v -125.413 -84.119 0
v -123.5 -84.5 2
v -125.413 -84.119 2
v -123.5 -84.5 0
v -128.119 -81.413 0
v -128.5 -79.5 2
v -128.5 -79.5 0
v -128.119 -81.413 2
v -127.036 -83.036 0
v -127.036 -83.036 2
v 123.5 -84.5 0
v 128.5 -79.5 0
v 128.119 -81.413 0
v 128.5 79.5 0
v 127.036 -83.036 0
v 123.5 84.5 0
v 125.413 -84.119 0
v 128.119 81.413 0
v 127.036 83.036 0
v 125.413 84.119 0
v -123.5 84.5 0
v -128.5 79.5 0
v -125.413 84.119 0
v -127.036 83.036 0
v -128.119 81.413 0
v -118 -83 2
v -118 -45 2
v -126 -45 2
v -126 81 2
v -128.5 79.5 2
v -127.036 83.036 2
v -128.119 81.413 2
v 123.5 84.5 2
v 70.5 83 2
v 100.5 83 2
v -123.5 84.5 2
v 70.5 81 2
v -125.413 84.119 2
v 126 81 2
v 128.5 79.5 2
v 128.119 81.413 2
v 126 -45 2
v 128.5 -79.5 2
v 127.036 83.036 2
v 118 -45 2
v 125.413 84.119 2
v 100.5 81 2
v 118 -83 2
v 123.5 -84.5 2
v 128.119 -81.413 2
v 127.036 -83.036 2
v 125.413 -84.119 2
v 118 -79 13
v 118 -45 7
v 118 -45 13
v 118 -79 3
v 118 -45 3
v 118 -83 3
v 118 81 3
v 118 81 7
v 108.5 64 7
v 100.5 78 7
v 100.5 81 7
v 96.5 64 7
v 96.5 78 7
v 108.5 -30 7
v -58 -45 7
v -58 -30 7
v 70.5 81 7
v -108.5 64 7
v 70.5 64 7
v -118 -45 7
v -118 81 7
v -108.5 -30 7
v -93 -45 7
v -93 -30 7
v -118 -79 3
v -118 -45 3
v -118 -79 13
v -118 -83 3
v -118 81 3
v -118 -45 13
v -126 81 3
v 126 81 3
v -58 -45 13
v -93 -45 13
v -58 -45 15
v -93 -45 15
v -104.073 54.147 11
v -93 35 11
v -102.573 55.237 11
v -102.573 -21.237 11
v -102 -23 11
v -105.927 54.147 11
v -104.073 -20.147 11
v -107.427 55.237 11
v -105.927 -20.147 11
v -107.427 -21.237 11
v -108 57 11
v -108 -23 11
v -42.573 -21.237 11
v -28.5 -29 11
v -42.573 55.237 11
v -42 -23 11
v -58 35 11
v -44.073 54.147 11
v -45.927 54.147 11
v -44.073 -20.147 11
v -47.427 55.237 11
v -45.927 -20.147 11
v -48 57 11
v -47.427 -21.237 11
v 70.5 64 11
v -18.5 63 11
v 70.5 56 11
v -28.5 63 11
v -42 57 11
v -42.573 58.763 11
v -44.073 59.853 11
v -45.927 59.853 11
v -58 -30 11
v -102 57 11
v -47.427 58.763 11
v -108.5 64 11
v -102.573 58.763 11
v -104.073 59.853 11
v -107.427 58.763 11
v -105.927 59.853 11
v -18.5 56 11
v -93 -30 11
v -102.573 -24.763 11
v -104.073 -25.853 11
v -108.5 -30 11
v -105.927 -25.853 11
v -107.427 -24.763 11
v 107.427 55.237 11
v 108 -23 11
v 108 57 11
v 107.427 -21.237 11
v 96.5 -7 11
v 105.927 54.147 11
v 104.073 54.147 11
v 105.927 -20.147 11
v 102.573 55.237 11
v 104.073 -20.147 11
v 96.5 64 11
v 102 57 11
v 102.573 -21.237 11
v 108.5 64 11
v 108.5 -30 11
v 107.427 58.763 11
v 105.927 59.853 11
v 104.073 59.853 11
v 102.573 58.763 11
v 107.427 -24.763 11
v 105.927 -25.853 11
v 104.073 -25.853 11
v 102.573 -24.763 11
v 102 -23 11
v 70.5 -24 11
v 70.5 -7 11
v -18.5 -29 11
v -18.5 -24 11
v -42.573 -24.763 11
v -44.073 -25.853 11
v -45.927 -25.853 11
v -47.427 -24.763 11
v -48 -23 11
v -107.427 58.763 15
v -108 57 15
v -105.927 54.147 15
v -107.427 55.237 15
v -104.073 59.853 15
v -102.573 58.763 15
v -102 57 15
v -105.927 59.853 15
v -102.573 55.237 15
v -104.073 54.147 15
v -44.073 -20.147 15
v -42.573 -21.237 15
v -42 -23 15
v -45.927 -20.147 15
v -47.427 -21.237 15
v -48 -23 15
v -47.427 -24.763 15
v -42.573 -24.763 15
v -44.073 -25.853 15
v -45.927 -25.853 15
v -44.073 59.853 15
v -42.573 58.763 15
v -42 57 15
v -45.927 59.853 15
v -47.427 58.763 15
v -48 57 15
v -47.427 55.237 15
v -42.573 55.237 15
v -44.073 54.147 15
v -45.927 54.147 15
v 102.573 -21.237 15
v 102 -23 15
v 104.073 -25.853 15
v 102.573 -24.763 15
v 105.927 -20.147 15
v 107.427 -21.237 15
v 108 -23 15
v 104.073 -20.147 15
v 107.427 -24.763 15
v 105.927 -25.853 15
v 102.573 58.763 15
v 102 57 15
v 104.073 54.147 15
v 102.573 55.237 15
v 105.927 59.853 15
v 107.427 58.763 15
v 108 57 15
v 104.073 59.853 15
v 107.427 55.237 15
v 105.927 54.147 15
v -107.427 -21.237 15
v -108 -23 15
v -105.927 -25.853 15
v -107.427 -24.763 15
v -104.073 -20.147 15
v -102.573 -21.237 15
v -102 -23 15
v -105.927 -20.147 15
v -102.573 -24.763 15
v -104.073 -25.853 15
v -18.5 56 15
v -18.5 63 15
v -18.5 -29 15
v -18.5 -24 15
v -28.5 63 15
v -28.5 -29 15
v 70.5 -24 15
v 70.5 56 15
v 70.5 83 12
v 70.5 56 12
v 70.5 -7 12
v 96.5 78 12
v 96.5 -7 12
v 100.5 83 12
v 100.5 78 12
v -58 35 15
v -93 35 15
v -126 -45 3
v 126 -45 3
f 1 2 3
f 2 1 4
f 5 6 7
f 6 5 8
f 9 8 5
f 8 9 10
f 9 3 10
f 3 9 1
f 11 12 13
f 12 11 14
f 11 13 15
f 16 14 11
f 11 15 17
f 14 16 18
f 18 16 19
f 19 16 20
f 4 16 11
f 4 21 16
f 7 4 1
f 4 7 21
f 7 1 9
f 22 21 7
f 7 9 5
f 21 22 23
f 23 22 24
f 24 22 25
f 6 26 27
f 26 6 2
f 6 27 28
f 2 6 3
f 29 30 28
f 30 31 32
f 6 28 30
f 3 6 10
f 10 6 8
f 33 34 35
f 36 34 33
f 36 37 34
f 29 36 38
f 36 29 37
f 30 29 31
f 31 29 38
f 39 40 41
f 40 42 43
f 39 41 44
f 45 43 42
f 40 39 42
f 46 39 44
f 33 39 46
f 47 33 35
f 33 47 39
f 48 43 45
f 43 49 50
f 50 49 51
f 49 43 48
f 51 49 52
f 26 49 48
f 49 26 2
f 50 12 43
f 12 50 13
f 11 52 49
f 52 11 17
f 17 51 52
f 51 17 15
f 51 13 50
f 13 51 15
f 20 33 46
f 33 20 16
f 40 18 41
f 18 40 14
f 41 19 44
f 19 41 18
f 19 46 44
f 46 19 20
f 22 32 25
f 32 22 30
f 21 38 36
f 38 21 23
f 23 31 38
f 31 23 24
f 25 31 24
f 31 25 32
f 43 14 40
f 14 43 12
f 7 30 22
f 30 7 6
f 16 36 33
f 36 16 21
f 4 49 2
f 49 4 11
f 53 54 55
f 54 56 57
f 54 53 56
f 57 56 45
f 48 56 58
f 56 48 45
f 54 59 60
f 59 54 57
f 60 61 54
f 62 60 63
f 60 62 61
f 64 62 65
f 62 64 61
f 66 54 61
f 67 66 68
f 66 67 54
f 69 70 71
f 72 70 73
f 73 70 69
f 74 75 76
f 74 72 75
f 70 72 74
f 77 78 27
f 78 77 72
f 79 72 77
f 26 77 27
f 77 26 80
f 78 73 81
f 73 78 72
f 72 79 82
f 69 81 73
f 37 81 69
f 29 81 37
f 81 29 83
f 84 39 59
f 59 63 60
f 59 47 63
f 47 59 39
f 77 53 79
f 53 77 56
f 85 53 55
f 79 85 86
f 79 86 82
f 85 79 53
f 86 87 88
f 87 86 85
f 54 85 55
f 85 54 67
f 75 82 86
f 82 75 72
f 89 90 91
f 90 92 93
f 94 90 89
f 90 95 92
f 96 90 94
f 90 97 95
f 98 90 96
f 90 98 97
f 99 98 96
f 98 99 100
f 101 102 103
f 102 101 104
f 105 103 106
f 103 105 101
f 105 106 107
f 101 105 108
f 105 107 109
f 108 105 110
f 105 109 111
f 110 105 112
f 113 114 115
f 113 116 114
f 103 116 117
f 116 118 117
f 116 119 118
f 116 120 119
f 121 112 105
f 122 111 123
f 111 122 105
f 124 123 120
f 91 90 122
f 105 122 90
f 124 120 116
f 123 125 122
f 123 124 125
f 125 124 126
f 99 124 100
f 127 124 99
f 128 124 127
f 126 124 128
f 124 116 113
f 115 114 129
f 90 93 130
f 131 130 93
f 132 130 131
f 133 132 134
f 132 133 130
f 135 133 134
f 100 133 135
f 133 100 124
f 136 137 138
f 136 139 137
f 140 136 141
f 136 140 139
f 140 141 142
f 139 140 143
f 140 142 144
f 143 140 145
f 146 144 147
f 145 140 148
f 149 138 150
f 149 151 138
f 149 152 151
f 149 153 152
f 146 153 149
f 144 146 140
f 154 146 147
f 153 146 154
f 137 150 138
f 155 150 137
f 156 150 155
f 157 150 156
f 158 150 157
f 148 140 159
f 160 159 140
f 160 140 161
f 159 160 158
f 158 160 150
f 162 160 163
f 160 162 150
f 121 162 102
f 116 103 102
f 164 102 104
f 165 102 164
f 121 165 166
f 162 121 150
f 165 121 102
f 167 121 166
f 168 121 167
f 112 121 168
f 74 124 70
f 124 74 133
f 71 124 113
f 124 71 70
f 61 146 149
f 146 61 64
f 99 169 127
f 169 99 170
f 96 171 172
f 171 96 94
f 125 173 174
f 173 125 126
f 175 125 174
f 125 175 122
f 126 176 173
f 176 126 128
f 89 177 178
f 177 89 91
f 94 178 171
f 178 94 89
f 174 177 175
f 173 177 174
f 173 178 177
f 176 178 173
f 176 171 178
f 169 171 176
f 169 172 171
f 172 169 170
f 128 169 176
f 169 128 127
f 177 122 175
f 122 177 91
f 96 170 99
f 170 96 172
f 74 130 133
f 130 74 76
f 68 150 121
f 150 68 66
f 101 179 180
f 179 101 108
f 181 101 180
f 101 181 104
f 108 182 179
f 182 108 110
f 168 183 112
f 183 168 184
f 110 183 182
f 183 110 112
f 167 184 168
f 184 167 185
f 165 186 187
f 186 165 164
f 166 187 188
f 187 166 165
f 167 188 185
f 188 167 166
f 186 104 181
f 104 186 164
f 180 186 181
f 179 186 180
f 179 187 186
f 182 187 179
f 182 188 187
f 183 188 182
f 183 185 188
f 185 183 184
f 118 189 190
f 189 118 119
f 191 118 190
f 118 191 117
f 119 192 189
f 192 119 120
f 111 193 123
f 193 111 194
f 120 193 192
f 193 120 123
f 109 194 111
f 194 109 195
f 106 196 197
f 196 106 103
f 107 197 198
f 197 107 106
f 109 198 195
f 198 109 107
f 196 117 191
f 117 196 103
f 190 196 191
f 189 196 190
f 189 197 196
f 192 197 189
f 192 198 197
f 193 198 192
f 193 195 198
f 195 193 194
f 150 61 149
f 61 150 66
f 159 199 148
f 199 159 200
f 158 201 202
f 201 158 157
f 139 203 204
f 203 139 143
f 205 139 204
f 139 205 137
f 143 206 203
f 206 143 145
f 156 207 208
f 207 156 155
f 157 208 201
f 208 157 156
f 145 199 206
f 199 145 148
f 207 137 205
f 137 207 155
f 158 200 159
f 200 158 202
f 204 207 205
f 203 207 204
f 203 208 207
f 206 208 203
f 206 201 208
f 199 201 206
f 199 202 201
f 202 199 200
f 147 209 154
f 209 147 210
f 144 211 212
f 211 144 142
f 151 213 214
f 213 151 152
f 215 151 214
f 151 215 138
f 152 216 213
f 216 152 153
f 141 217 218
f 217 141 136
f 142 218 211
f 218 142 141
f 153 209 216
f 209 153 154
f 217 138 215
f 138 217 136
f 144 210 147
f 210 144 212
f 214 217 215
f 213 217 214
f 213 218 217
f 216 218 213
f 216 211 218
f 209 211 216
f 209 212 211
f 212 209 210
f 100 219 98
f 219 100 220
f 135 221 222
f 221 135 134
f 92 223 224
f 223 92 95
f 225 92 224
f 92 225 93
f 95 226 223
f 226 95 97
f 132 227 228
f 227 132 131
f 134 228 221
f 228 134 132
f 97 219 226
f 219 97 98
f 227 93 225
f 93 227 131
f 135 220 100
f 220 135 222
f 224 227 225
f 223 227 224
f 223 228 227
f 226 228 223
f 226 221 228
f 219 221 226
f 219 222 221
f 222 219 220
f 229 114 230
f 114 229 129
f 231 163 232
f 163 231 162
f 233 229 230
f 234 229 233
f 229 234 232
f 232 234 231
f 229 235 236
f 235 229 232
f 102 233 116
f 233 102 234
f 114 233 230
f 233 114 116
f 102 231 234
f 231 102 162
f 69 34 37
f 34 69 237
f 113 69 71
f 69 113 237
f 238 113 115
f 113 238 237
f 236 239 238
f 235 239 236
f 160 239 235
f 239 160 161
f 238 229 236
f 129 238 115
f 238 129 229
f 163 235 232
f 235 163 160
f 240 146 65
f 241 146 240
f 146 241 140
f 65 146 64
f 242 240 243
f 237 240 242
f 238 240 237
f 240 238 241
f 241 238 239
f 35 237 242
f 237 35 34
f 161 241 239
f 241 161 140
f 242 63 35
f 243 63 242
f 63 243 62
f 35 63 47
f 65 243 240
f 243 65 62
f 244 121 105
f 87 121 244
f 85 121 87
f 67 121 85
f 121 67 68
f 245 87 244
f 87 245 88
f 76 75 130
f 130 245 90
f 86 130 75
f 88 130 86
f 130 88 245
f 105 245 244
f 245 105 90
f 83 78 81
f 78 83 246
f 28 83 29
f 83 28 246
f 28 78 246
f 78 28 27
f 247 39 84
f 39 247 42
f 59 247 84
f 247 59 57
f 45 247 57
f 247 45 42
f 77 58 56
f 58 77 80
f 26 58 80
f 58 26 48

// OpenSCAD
// file: ../externals/roundedCube.scad
// https://stackoverflow.com/questions/33146741/way-to-round-edges-of-objects-openscad/33289349#33289349
module roundedCube(xx, yy, height, radius) {
    difference() {
        cube([xx,yy,height]);

        difference() {
            translate([-.5,-.5,-.2]) cube([radius+.5,radius+.5,height+.5]);
            translate([radius,radius,height/2]) cylinder(height,radius,radius,true);
        }

        translate([xx,0,0]) rotate(90) difference() {
            translate([-.5,-.5,-.2]) cube([radius+.5,radius+.5,height+.5]);
            translate([radius,radius,height/2]) cylinder(height,radius,radius,true);
        }

        translate([xx,yy,0]) rotate(180) difference() {
            translate([-.5,-.5,-.2]) cube([radius+.5,radius+.5,height+.5]);
            translate([radius,radius,height/2]) cylinder(height,radius,radius,true);
        }

        translate([0,yy,0]) rotate(270) difference() {
            translate([-.5,-.5,-.2]) cube([radius+.5,radius+.5,height+.5]);
            translate([radius,radius,height/2]) cylinder(height,radius,radius,true);
        }
    }
}

// https://danielupshaw.com/openscad-rounded-corners/
module roundedCube2(size = [1, 1, 1], center = false, radius = 0.5, apply_to = "all") {
	// If single value, convert to [x, y, z] vector
	size = (size[0] == undef) ? [size, size, size] : size;

	translate_min = radius;
	translate_xmax = size[0] - radius;
	translate_ymax = size[1] - radius;
	translate_zmax = size[2] - radius;

	diameter = radius * 2;

	obj_translate = (center == false) ?
		[0, 0, 0] : [
			-(size[0] / 2),
			-(size[1] / 2),
			-(size[2] / 2)
		];

	translate(v = obj_translate) {
		hull() {
			for (translate_x = [translate_min, translate_xmax]) {
				x_at = (translate_x == translate_min) ? "min" : "max";
				for (translate_y = [translate_min, translate_ymax]) {
					y_at = (translate_y == translate_min) ? "min" : "max";
					for (translate_z = [translate_min, translate_zmax]) {
						z_at = (translate_z == translate_min) ? "min" : "max";

						translate(v = [translate_x, translate_y, translate_z])
						if (
							(apply_to == "all") ||
							(apply_to == "xmin" && x_at == "min") || (apply_to == "xmax" && x_at == "max") ||
							(apply_to == "ymin" && y_at == "min") || (apply_to == "ymax" && y_at == "max") ||
							(apply_to == "zmin" && z_at == "min") || (apply_to == "zmax" && z_at == "max")
						) {
							sphere(r = radius);
						} else {
							rotate =
								(apply_to == "xmin" || apply_to == "xmax" || apply_to == "x") ? [0, 90, 0] : (
								(apply_to == "ymin" || apply_to == "ymax" || apply_to == "y") ? [90, 90, 0] :
								[0, 0, 0]
							);
							rotate(a = rotate)
							cylinder(h = diameter, r = radius, center = true);
						}
					}
				}
			}
		}
	}
}
// main file
use <../externals/roundedCube.scad>

/* Sunfounder 10.1 inch Display kit */
GlassWidth = 257;
GlassHeight = 169;
GlassDepth = 2;

MainPanelWidth = 236;
MainPanelHeight = 160;
MainPanelDepth = 5;

TopMargin = -1;

SupportAreaWidth = 217;
SupportAreaHeight = 94;
SupportAreaDepth = 4;
DebugSupportArea = 1;

SupportBlockWidth = 7;
SupportBlockHeight = 14;
SupportBlockDepth = 4;
SupportHoleRadius = 3;

module sunfounder_10_1() {
    BottomWidth = MainPanelWidth;
    BottomHeight = 34;
    BottomDepth = 11;

    SideBottomWidth = MainPanelWidth;
    SideBottomHeight = 4;
    SideLRWidth = 8;
    SideLRHeight = 126;

    translate([-GlassWidth / 2, -GlassHeight / 2, 0]) {
        /* Glass */
        color("black") roundedCube(GlassWidth, GlassHeight, GlassDepth, 5);

        translate([0, 0, GlassDepth]) {
            translate([(GlassWidth - MainPanelWidth) / 2,
                       (GlassHeight - MainPanelHeight) / 2 - TopMargin, 0]) {
                /* Main & Bottom */
                color("gray") {
                    cube([MainPanelWidth, MainPanelHeight, MainPanelDepth]);
                    cube([BottomWidth, BottomHeight, BottomDepth]);
                }

                /* DisplayBoard connector */
                color("orange")
                    translate([25, BottomHeight, MainPanelDepth])
                        cube([35, 80, SupportBlockDepth * 2]);

                /* Support Area */
                translate([(MainPanelWidth - SupportAreaWidth) / 2,
                           (MainPanelHeight - SupportAreaHeight) / 2 + 16,
                           MainPanelDepth]) {
                    if (DebugSupportArea) {
                        color("gray", alpha=0.2)
                            cube([SupportAreaWidth, SupportAreaHeight, SupportAreaDepth]);
                    }

                    color("red") {
                        /* DisplayBoard LB */
                        cube([SupportBlockWidth, SupportBlockHeight, SupportBlockDepth]);
                        translate([SupportBlockWidth/2, SupportBlockHeight/2, 0])
                            cylinder(SupportBlockDepth * 2, r=SupportHoleRadius);

                        /* DisplayBoard LT */
                        translate([0, SupportAreaHeight-SupportBlockHeight, 0]) {
                            cube([SupportBlockWidth, SupportBlockHeight, SupportBlockDepth]);
                            translate([SupportBlockWidth/2, SupportBlockHeight/2, 0])
                                cylinder(SupportBlockDepth * 2, r=SupportHoleRadius);
                        }

                        /* DisplayBoard RB */
                        translate([60, 0, 0]) {
                            cube([SupportBlockWidth, SupportBlockHeight, SupportBlockDepth]);
                            translate([SupportBlockWidth/2, SupportBlockHeight/2, 0])
                                cylinder(SupportBlockDepth * 2, r=SupportHoleRadius);
                        }

                        /* DisplayBoard RT */
                        translate([60, SupportAreaHeight-SupportBlockHeight, 0]) {
                            cube([SupportBlockWidth, SupportBlockHeight, SupportBlockDepth]);
                            translate([SupportBlockWidth/2, SupportBlockHeight/2, 0])
                                cylinder(SupportBlockDepth * 2, r=SupportHoleRadius);
                        }

                        /* RpiBoard Vertical Rail */
                        translate([80, SupportAreaHeight - 93, 0])
                            cube([10, 92, SupportBlockDepth * 2]);

                        /* RpiBoard space */
                        translate([80, SupportAreaHeight - 88, 0])
                            cube([99, 80, SupportBlockDepth * 2]);

                        /* Right Bottom */
                        translate([SupportAreaWidth - SupportBlockWidth, 0, 0]) {
                            cube([SupportBlockWidth, SupportBlockHeight, SupportBlockDepth]);
                            translate([SupportBlockWidth/2, SupportBlockHeight/2, 0])
                                cylinder(SupportBlockDepth * 2, r=SupportHoleRadius);
                        }

                        /* Right Top */
                        translate([SupportAreaWidth - SupportBlockWidth,
                                   SupportAreaHeight - SupportBlockHeight, 0]) {
                            cube([SupportBlockWidth, SupportBlockHeight, SupportBlockDepth]);
                            translate([SupportBlockWidth/2, SupportBlockHeight/2, 0])
                                cylinder(SupportBlockDepth * 2, r=SupportHoleRadius);
                        }
                    }

                    /* Touch Connector */
                    color("orange") {
                        translate([179, SupportAreaHeight - 71, 0])
                            cube([26, 90, 5]);
                        translate([179, SupportAreaHeight - 71 + 90 - 5, -MainPanelDepth])
                            cube([30, 5, MainPanelDepth + 5]);
                    }
                }
            }

            /* Side - Left/Right/Bottom */
            color("gray") {
                translate([(GlassWidth - MainPanelWidth) / 2 - SideLRWidth,
                           (GlassHeight - MainPanelHeight) / 2 + BottomHeight - TopMargin, 0])
                    cube([SideLRWidth, SideLRHeight, 1]);

                translate([(GlassWidth - MainPanelWidth) / 2 + MainPanelWidth,
                           (GlassHeight - MainPanelHeight) / 2 + BottomHeight - TopMargin, 0])
                    cube([SideLRWidth, SideLRHeight, 1]);

                translate([(GlassWidth - MainPanelWidth) / 2,
                           (GlassHeight - MainPanelHeight) / 2 - SideBottomHeight - TopMargin, 0])
                    cube([BottomWidth, SideBottomHeight, 1]);
            }
        }
    }
}

// ----------------------------------------------------------------

sunfounder_10_1();
